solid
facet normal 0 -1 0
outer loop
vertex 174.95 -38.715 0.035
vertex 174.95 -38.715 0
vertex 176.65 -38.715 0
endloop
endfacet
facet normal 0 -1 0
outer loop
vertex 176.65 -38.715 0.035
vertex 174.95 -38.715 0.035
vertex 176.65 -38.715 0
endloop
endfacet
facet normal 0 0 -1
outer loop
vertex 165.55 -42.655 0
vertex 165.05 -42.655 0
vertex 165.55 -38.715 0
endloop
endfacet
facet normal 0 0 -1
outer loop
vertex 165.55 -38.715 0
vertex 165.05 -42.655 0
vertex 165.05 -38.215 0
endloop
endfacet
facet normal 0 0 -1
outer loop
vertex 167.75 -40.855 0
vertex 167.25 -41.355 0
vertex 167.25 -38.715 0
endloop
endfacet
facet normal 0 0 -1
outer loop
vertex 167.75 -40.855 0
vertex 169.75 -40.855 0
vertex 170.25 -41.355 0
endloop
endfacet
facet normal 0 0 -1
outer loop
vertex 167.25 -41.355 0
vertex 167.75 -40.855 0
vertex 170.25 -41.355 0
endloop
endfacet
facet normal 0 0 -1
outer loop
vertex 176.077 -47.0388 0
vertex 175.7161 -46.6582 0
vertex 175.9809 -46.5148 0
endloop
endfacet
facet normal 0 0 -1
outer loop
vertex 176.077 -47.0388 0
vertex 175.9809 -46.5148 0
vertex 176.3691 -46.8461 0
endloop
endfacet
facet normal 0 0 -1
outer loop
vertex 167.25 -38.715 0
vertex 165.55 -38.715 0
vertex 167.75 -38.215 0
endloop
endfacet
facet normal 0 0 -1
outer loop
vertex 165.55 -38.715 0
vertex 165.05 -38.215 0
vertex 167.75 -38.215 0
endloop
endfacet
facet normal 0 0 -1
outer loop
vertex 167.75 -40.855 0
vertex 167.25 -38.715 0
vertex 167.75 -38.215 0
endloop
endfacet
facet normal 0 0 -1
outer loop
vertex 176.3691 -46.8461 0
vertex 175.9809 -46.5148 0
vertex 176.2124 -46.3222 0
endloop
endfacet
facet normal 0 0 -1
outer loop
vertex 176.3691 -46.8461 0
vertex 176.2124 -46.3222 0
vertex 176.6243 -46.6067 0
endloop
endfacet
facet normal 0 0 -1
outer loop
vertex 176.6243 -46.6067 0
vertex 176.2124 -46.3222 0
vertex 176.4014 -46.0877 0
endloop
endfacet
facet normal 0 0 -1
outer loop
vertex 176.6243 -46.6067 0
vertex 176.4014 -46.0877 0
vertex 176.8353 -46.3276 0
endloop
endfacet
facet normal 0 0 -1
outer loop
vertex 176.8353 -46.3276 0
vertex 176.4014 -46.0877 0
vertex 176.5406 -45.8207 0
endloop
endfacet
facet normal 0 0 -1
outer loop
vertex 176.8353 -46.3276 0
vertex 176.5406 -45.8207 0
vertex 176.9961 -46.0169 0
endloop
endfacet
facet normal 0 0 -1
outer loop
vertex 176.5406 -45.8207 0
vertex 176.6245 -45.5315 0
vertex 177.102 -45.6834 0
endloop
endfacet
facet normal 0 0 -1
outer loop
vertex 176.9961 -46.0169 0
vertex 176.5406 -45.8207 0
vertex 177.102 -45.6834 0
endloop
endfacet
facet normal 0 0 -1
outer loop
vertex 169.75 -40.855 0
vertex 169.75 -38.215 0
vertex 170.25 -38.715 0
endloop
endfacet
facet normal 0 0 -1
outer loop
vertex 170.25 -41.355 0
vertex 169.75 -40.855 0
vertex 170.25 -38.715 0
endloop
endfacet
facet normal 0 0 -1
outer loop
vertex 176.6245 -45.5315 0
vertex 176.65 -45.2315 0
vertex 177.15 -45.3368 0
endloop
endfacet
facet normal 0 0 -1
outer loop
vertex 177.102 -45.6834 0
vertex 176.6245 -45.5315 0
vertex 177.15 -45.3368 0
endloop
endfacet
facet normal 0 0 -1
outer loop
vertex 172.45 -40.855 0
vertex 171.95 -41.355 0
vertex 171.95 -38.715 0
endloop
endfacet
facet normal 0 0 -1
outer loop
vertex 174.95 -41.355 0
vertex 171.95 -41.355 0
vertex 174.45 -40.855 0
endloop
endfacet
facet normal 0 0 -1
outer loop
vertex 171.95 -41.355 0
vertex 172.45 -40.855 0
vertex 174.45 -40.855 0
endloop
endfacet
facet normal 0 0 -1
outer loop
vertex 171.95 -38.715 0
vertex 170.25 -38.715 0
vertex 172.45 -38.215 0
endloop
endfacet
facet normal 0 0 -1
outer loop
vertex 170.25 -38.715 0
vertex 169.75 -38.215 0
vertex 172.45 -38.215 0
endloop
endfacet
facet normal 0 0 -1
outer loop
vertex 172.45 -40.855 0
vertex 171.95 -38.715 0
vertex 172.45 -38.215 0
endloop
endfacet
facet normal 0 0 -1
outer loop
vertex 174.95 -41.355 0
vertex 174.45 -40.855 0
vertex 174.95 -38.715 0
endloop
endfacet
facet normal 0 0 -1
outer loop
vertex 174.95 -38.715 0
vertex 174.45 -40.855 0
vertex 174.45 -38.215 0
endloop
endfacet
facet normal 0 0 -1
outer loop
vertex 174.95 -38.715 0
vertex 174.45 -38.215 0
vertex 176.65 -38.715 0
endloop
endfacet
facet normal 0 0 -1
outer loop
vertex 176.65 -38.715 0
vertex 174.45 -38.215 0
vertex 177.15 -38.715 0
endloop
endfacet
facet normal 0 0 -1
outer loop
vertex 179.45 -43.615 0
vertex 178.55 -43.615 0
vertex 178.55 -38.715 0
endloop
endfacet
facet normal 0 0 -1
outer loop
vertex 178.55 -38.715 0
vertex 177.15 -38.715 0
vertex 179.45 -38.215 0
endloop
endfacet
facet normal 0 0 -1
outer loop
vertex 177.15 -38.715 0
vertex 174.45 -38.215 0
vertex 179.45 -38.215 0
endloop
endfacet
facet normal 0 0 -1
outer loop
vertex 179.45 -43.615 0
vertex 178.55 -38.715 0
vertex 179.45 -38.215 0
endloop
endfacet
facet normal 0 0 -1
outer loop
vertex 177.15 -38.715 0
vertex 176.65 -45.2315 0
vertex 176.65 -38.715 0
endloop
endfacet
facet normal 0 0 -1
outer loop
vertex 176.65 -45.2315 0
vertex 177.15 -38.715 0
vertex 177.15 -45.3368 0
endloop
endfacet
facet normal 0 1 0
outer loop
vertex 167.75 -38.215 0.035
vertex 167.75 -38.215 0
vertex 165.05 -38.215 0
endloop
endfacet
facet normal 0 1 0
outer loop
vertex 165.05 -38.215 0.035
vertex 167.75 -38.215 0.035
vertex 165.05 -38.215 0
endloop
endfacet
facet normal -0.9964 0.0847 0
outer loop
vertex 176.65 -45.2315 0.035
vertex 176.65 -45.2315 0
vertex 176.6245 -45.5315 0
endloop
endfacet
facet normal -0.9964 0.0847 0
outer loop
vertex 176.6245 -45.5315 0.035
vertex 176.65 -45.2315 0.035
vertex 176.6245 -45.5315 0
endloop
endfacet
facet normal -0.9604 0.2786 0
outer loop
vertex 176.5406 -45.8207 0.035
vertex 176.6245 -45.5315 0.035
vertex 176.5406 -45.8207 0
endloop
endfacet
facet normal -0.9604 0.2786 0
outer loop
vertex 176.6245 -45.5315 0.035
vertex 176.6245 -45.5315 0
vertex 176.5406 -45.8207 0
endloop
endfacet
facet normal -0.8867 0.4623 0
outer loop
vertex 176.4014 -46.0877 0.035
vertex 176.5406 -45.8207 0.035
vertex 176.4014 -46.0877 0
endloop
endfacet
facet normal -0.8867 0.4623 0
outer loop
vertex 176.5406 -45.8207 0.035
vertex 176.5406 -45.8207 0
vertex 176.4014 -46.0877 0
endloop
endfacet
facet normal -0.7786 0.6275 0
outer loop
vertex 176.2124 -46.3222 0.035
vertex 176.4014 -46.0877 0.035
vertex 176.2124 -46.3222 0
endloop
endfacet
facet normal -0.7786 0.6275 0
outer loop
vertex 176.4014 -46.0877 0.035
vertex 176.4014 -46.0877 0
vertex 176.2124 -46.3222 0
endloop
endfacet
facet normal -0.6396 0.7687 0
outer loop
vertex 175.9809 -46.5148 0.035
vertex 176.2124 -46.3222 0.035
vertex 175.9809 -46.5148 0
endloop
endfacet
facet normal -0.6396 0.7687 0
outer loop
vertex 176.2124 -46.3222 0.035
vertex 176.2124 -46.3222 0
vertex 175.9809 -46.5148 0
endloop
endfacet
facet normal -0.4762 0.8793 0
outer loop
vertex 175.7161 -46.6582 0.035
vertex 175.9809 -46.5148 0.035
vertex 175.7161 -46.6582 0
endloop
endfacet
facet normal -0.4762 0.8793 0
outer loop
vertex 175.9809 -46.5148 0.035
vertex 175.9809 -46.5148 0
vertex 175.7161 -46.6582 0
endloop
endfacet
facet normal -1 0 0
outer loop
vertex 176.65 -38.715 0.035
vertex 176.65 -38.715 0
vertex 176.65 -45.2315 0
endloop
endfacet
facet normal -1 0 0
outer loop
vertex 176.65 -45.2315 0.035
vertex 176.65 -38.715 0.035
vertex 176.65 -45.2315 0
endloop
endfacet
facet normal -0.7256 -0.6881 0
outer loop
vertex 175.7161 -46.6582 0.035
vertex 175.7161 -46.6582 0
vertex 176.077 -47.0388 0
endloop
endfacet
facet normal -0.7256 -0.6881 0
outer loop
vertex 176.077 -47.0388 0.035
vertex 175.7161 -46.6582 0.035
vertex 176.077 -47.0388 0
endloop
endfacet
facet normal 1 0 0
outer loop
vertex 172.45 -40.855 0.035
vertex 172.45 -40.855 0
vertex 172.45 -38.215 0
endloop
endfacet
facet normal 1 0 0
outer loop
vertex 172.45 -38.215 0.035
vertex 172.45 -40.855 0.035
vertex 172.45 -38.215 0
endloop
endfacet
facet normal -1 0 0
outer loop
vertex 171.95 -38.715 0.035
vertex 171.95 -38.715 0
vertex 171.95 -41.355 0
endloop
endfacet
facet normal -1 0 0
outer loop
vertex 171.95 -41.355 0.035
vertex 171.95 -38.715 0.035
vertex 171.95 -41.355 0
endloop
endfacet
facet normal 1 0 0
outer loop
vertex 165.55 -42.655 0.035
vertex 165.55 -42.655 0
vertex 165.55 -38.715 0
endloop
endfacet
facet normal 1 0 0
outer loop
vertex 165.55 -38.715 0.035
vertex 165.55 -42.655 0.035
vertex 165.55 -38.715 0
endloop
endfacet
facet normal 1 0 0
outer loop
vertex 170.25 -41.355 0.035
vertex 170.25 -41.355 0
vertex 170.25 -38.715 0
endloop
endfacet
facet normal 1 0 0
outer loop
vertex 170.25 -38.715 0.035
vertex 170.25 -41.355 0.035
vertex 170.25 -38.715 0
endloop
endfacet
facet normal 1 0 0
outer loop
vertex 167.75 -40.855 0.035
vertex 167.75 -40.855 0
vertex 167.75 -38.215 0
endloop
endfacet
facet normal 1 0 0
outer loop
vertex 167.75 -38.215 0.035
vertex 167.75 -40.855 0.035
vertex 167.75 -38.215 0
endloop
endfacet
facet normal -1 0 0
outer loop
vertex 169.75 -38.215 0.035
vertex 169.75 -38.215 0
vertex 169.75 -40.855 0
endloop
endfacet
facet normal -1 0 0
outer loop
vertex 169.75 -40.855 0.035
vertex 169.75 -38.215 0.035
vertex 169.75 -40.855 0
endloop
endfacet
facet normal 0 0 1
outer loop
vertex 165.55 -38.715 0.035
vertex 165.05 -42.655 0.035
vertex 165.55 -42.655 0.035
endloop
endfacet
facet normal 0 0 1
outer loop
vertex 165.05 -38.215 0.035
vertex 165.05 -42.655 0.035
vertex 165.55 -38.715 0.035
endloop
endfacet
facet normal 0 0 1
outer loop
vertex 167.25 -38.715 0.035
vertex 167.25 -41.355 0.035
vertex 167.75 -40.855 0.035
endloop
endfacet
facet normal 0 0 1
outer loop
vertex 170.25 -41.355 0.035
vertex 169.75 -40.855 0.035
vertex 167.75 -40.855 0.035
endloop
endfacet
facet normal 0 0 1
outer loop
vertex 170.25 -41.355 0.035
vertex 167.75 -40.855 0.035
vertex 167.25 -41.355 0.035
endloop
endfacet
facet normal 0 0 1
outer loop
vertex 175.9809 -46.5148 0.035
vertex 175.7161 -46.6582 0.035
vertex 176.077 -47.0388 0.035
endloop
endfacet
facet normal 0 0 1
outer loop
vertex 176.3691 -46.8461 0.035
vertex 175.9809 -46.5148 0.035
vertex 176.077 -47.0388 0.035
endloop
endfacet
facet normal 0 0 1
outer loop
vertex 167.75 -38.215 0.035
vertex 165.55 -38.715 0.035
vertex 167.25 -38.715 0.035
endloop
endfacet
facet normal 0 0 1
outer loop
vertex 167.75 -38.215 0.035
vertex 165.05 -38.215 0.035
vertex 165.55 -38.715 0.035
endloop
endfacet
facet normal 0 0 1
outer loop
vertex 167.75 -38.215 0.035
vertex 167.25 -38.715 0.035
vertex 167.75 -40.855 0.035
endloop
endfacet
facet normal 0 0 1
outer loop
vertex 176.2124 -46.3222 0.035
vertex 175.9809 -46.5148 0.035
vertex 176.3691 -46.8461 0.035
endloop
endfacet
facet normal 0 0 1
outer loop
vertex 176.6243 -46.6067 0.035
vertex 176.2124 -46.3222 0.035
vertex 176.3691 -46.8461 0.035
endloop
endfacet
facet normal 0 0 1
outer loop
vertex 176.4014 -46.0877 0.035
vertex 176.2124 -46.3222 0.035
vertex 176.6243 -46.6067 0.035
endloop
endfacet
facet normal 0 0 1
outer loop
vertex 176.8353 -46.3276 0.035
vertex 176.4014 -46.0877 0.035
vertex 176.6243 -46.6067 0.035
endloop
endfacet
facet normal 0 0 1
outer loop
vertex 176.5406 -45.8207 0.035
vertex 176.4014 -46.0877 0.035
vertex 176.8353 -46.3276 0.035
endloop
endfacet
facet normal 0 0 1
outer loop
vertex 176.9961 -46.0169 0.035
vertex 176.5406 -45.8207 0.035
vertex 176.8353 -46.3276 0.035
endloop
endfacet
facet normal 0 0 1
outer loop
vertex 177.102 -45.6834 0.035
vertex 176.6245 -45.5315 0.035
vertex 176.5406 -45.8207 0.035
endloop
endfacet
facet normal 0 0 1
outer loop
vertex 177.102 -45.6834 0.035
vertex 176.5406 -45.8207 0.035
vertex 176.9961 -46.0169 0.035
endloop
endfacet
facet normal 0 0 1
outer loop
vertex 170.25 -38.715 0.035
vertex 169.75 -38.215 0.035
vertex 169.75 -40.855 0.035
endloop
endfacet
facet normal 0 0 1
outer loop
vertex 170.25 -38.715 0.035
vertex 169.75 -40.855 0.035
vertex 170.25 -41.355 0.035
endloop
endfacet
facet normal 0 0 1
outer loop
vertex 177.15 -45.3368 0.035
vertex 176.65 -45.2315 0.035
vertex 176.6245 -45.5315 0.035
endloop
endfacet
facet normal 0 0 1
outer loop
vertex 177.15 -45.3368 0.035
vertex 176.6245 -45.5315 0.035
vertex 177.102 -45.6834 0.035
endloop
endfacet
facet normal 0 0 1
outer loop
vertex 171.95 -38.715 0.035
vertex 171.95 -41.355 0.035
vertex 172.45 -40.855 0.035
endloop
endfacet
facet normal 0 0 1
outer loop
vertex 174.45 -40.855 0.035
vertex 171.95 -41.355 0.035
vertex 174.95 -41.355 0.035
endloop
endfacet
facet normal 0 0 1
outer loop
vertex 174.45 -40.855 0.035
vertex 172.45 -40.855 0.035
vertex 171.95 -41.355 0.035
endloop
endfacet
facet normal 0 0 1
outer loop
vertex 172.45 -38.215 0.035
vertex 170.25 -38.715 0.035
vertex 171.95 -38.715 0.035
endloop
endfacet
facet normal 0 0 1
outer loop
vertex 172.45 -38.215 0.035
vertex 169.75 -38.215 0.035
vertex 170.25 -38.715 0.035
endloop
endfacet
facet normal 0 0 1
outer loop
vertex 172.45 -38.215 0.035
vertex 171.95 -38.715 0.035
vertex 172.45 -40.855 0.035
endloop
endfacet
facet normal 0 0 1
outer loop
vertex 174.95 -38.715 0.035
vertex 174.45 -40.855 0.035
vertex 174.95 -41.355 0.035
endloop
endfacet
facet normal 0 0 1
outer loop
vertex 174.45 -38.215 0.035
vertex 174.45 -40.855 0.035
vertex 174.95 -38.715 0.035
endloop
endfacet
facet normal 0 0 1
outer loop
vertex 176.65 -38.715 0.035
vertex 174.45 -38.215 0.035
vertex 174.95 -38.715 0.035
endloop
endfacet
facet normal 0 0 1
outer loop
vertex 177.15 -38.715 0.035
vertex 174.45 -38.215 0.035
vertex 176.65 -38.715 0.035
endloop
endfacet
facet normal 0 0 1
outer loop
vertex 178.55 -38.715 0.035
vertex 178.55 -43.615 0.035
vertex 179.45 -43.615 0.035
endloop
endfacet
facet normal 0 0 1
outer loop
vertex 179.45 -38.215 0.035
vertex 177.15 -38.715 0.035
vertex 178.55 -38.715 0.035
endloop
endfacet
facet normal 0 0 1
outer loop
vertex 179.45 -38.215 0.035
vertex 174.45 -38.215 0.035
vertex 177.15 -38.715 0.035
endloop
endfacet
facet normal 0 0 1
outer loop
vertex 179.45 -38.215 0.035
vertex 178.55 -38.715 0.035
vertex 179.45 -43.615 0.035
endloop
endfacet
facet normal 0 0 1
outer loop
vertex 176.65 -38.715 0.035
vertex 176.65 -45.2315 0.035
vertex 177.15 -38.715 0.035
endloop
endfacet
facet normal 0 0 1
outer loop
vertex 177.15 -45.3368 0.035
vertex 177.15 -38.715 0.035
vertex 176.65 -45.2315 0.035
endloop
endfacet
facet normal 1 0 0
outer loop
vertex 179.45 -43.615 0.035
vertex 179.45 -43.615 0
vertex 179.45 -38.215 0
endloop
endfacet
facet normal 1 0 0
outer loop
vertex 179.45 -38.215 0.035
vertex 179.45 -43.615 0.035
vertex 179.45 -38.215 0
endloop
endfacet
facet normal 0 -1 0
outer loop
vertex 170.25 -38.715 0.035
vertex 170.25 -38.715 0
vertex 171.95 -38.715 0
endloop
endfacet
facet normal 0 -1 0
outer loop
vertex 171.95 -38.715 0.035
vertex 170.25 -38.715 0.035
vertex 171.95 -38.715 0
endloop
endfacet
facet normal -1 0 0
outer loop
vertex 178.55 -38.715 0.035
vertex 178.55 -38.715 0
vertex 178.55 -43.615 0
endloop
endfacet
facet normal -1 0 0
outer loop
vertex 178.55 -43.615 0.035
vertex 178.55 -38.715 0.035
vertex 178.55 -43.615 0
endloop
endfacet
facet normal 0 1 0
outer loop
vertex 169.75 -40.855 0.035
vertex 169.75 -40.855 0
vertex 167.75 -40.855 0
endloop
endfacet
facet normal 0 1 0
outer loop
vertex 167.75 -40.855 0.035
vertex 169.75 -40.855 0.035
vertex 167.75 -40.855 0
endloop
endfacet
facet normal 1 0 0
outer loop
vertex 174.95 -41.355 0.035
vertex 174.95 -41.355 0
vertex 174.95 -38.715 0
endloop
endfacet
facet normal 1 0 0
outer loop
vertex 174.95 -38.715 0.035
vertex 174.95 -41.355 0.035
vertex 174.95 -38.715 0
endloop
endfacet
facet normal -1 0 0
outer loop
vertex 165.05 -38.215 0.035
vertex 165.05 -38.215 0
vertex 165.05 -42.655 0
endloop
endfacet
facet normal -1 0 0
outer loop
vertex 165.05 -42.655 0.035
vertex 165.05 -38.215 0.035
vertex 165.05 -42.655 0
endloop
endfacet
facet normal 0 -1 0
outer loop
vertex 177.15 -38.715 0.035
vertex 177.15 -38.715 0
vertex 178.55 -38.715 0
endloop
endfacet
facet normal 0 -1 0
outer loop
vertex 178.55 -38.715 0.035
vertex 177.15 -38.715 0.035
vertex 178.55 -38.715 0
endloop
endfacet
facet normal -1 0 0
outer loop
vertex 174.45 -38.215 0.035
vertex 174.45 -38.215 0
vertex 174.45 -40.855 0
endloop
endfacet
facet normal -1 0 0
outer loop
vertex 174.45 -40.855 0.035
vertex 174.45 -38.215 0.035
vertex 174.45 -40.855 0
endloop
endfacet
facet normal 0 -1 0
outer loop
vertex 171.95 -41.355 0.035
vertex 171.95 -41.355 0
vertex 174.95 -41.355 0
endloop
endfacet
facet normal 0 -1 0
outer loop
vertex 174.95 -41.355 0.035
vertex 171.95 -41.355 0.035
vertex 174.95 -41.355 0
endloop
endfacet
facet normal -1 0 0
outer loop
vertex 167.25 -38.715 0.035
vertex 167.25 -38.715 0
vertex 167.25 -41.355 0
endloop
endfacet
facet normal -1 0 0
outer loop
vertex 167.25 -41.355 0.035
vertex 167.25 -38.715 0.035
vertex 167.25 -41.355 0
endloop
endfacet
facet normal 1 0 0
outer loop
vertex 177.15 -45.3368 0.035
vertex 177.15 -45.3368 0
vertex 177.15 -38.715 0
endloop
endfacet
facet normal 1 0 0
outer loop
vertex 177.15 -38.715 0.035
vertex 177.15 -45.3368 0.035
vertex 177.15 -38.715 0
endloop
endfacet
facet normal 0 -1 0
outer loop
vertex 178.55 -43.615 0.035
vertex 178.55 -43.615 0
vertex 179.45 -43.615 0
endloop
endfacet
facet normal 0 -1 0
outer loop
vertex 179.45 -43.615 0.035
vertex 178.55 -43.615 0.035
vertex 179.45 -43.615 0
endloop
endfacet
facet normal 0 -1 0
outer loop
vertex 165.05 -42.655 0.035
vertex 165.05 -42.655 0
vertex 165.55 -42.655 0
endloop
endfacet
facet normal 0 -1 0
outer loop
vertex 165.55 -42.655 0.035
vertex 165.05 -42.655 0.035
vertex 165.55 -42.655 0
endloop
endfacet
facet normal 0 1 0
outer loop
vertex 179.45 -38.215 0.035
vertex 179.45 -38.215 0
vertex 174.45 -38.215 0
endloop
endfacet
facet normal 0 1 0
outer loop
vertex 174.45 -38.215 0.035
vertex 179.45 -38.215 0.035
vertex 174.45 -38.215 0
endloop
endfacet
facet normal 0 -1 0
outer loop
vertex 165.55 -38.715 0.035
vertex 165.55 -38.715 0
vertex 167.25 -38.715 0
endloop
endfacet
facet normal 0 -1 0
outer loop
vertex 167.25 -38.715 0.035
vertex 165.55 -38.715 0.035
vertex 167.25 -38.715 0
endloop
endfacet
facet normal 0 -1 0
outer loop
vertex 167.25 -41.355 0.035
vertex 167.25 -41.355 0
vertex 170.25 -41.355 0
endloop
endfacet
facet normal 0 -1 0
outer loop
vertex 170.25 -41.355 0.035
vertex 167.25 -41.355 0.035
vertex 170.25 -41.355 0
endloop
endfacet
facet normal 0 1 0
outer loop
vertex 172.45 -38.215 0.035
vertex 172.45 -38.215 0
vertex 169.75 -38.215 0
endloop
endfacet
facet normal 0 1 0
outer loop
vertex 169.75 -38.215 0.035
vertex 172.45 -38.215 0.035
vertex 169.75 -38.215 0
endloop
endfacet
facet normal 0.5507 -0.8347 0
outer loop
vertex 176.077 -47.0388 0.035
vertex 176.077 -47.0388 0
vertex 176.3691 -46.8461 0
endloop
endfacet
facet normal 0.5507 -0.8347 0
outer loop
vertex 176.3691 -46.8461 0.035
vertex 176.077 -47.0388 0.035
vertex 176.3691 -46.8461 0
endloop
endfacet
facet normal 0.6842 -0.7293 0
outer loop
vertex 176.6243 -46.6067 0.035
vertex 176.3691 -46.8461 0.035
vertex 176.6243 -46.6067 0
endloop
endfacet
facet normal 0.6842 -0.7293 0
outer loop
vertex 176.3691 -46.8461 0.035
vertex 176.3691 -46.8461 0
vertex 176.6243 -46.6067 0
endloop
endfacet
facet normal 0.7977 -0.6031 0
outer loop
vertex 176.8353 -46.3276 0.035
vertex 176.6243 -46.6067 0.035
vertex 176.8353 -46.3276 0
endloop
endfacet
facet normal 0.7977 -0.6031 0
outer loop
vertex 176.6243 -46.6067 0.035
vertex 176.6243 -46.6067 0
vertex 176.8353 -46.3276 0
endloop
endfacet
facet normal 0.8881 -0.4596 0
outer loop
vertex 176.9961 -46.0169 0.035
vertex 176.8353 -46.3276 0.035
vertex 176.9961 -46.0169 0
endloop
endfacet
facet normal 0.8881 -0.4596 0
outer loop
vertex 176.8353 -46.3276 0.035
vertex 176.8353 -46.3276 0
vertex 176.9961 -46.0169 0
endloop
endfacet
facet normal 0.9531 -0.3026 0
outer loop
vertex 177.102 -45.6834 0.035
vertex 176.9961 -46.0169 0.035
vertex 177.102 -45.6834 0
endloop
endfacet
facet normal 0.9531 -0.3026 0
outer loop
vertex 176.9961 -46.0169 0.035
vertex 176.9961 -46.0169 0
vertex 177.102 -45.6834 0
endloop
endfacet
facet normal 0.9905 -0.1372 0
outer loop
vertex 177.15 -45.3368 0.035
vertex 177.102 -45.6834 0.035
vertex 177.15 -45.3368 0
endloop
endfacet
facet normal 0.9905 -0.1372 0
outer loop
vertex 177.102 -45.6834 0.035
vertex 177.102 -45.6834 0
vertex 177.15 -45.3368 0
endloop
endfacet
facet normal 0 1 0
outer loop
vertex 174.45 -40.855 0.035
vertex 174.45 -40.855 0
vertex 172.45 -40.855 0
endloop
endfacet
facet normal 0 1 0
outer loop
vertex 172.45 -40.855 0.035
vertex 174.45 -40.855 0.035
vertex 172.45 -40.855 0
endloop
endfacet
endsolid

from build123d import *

# Parameters (mm, degrees)
BOSS_EXTRUDE1_DEPTH = 0.035


with BuildPart() as part:
    # Sketch2 → Boss-Extrude1 (new body)
    with BuildSketch(Plane.XY):
        with BuildLine():
            Line((177.15, -43.365), (177.15, -38.715))
            Line((177.15, -38.715), (178.55, -38.715))
            Line((178.55, -38.715), (178.55, -43.615))
            Line((178.55, -43.615), (179.45, -43.615))
            Line((179.45, -43.615), (179.45, -38.215))
            Line((179.45, -38.215), (174.45, -38.215))
            Line((174.45, -38.215), (174.45, -40.855))
            Line((174.45, -40.855), (172.45, -40.855))
            Line((172.45, -40.855), (172.45, -38.215))
            Line((172.45, -38.215), (169.75, -38.215))
            Line((169.75, -38.215), (169.75, -40.855))
            Line((169.75, -40.855), (167.75, -40.855))
            Line((167.75, -40.855), (167.75, -38.215))
            Line((167.75, -38.215), (165.05, -38.215))
            Line((165.05, -38.215), (165.05, -42.655))
            Line((165.05, -42.655), (165.55, -42.655))
            Line((165.55, -42.655), (165.55, -38.715))
            Line((165.55, -38.715), (167.25, -38.715))
            Line((167.25, -38.715), (167.25, -41.355))
            Line((167.25, -41.355), (170.25, -41.355))
            Line((170.25, -41.355), (170.25, -38.715))
            Line((170.25, -38.715), (171.95, -38.715))
            Line((171.95, -38.715), (171.95, -41.355))
            Line((171.95, -41.355), (174.95, -41.355))
            Line((174.95, -41.355), (174.95, -38.715))
            Line((174.95, -38.715), (176.65, -38.715))
            Line((176.65, -38.715), (176.65, -43.494121754))
            Line((176.65, -43.494121754), (176.65, -45.231483))
            ThreePointArc((176.65, -45.231483), (176.401357883, -46.087735796), (175.716135, -46.658228))
            Line((175.716135, -46.658228), (176.077028, -47.038824))
            ThreePointArc((176.077028, -47.038824), (176.835321007, -46.327629006), (177.15, -45.336779))
            Line((177.15, -45.336779), (177.15, -43.365))
        make_face()
    extrude(amount=BOSS_EXTRUDE1_DEPTH)


solid = part.part
